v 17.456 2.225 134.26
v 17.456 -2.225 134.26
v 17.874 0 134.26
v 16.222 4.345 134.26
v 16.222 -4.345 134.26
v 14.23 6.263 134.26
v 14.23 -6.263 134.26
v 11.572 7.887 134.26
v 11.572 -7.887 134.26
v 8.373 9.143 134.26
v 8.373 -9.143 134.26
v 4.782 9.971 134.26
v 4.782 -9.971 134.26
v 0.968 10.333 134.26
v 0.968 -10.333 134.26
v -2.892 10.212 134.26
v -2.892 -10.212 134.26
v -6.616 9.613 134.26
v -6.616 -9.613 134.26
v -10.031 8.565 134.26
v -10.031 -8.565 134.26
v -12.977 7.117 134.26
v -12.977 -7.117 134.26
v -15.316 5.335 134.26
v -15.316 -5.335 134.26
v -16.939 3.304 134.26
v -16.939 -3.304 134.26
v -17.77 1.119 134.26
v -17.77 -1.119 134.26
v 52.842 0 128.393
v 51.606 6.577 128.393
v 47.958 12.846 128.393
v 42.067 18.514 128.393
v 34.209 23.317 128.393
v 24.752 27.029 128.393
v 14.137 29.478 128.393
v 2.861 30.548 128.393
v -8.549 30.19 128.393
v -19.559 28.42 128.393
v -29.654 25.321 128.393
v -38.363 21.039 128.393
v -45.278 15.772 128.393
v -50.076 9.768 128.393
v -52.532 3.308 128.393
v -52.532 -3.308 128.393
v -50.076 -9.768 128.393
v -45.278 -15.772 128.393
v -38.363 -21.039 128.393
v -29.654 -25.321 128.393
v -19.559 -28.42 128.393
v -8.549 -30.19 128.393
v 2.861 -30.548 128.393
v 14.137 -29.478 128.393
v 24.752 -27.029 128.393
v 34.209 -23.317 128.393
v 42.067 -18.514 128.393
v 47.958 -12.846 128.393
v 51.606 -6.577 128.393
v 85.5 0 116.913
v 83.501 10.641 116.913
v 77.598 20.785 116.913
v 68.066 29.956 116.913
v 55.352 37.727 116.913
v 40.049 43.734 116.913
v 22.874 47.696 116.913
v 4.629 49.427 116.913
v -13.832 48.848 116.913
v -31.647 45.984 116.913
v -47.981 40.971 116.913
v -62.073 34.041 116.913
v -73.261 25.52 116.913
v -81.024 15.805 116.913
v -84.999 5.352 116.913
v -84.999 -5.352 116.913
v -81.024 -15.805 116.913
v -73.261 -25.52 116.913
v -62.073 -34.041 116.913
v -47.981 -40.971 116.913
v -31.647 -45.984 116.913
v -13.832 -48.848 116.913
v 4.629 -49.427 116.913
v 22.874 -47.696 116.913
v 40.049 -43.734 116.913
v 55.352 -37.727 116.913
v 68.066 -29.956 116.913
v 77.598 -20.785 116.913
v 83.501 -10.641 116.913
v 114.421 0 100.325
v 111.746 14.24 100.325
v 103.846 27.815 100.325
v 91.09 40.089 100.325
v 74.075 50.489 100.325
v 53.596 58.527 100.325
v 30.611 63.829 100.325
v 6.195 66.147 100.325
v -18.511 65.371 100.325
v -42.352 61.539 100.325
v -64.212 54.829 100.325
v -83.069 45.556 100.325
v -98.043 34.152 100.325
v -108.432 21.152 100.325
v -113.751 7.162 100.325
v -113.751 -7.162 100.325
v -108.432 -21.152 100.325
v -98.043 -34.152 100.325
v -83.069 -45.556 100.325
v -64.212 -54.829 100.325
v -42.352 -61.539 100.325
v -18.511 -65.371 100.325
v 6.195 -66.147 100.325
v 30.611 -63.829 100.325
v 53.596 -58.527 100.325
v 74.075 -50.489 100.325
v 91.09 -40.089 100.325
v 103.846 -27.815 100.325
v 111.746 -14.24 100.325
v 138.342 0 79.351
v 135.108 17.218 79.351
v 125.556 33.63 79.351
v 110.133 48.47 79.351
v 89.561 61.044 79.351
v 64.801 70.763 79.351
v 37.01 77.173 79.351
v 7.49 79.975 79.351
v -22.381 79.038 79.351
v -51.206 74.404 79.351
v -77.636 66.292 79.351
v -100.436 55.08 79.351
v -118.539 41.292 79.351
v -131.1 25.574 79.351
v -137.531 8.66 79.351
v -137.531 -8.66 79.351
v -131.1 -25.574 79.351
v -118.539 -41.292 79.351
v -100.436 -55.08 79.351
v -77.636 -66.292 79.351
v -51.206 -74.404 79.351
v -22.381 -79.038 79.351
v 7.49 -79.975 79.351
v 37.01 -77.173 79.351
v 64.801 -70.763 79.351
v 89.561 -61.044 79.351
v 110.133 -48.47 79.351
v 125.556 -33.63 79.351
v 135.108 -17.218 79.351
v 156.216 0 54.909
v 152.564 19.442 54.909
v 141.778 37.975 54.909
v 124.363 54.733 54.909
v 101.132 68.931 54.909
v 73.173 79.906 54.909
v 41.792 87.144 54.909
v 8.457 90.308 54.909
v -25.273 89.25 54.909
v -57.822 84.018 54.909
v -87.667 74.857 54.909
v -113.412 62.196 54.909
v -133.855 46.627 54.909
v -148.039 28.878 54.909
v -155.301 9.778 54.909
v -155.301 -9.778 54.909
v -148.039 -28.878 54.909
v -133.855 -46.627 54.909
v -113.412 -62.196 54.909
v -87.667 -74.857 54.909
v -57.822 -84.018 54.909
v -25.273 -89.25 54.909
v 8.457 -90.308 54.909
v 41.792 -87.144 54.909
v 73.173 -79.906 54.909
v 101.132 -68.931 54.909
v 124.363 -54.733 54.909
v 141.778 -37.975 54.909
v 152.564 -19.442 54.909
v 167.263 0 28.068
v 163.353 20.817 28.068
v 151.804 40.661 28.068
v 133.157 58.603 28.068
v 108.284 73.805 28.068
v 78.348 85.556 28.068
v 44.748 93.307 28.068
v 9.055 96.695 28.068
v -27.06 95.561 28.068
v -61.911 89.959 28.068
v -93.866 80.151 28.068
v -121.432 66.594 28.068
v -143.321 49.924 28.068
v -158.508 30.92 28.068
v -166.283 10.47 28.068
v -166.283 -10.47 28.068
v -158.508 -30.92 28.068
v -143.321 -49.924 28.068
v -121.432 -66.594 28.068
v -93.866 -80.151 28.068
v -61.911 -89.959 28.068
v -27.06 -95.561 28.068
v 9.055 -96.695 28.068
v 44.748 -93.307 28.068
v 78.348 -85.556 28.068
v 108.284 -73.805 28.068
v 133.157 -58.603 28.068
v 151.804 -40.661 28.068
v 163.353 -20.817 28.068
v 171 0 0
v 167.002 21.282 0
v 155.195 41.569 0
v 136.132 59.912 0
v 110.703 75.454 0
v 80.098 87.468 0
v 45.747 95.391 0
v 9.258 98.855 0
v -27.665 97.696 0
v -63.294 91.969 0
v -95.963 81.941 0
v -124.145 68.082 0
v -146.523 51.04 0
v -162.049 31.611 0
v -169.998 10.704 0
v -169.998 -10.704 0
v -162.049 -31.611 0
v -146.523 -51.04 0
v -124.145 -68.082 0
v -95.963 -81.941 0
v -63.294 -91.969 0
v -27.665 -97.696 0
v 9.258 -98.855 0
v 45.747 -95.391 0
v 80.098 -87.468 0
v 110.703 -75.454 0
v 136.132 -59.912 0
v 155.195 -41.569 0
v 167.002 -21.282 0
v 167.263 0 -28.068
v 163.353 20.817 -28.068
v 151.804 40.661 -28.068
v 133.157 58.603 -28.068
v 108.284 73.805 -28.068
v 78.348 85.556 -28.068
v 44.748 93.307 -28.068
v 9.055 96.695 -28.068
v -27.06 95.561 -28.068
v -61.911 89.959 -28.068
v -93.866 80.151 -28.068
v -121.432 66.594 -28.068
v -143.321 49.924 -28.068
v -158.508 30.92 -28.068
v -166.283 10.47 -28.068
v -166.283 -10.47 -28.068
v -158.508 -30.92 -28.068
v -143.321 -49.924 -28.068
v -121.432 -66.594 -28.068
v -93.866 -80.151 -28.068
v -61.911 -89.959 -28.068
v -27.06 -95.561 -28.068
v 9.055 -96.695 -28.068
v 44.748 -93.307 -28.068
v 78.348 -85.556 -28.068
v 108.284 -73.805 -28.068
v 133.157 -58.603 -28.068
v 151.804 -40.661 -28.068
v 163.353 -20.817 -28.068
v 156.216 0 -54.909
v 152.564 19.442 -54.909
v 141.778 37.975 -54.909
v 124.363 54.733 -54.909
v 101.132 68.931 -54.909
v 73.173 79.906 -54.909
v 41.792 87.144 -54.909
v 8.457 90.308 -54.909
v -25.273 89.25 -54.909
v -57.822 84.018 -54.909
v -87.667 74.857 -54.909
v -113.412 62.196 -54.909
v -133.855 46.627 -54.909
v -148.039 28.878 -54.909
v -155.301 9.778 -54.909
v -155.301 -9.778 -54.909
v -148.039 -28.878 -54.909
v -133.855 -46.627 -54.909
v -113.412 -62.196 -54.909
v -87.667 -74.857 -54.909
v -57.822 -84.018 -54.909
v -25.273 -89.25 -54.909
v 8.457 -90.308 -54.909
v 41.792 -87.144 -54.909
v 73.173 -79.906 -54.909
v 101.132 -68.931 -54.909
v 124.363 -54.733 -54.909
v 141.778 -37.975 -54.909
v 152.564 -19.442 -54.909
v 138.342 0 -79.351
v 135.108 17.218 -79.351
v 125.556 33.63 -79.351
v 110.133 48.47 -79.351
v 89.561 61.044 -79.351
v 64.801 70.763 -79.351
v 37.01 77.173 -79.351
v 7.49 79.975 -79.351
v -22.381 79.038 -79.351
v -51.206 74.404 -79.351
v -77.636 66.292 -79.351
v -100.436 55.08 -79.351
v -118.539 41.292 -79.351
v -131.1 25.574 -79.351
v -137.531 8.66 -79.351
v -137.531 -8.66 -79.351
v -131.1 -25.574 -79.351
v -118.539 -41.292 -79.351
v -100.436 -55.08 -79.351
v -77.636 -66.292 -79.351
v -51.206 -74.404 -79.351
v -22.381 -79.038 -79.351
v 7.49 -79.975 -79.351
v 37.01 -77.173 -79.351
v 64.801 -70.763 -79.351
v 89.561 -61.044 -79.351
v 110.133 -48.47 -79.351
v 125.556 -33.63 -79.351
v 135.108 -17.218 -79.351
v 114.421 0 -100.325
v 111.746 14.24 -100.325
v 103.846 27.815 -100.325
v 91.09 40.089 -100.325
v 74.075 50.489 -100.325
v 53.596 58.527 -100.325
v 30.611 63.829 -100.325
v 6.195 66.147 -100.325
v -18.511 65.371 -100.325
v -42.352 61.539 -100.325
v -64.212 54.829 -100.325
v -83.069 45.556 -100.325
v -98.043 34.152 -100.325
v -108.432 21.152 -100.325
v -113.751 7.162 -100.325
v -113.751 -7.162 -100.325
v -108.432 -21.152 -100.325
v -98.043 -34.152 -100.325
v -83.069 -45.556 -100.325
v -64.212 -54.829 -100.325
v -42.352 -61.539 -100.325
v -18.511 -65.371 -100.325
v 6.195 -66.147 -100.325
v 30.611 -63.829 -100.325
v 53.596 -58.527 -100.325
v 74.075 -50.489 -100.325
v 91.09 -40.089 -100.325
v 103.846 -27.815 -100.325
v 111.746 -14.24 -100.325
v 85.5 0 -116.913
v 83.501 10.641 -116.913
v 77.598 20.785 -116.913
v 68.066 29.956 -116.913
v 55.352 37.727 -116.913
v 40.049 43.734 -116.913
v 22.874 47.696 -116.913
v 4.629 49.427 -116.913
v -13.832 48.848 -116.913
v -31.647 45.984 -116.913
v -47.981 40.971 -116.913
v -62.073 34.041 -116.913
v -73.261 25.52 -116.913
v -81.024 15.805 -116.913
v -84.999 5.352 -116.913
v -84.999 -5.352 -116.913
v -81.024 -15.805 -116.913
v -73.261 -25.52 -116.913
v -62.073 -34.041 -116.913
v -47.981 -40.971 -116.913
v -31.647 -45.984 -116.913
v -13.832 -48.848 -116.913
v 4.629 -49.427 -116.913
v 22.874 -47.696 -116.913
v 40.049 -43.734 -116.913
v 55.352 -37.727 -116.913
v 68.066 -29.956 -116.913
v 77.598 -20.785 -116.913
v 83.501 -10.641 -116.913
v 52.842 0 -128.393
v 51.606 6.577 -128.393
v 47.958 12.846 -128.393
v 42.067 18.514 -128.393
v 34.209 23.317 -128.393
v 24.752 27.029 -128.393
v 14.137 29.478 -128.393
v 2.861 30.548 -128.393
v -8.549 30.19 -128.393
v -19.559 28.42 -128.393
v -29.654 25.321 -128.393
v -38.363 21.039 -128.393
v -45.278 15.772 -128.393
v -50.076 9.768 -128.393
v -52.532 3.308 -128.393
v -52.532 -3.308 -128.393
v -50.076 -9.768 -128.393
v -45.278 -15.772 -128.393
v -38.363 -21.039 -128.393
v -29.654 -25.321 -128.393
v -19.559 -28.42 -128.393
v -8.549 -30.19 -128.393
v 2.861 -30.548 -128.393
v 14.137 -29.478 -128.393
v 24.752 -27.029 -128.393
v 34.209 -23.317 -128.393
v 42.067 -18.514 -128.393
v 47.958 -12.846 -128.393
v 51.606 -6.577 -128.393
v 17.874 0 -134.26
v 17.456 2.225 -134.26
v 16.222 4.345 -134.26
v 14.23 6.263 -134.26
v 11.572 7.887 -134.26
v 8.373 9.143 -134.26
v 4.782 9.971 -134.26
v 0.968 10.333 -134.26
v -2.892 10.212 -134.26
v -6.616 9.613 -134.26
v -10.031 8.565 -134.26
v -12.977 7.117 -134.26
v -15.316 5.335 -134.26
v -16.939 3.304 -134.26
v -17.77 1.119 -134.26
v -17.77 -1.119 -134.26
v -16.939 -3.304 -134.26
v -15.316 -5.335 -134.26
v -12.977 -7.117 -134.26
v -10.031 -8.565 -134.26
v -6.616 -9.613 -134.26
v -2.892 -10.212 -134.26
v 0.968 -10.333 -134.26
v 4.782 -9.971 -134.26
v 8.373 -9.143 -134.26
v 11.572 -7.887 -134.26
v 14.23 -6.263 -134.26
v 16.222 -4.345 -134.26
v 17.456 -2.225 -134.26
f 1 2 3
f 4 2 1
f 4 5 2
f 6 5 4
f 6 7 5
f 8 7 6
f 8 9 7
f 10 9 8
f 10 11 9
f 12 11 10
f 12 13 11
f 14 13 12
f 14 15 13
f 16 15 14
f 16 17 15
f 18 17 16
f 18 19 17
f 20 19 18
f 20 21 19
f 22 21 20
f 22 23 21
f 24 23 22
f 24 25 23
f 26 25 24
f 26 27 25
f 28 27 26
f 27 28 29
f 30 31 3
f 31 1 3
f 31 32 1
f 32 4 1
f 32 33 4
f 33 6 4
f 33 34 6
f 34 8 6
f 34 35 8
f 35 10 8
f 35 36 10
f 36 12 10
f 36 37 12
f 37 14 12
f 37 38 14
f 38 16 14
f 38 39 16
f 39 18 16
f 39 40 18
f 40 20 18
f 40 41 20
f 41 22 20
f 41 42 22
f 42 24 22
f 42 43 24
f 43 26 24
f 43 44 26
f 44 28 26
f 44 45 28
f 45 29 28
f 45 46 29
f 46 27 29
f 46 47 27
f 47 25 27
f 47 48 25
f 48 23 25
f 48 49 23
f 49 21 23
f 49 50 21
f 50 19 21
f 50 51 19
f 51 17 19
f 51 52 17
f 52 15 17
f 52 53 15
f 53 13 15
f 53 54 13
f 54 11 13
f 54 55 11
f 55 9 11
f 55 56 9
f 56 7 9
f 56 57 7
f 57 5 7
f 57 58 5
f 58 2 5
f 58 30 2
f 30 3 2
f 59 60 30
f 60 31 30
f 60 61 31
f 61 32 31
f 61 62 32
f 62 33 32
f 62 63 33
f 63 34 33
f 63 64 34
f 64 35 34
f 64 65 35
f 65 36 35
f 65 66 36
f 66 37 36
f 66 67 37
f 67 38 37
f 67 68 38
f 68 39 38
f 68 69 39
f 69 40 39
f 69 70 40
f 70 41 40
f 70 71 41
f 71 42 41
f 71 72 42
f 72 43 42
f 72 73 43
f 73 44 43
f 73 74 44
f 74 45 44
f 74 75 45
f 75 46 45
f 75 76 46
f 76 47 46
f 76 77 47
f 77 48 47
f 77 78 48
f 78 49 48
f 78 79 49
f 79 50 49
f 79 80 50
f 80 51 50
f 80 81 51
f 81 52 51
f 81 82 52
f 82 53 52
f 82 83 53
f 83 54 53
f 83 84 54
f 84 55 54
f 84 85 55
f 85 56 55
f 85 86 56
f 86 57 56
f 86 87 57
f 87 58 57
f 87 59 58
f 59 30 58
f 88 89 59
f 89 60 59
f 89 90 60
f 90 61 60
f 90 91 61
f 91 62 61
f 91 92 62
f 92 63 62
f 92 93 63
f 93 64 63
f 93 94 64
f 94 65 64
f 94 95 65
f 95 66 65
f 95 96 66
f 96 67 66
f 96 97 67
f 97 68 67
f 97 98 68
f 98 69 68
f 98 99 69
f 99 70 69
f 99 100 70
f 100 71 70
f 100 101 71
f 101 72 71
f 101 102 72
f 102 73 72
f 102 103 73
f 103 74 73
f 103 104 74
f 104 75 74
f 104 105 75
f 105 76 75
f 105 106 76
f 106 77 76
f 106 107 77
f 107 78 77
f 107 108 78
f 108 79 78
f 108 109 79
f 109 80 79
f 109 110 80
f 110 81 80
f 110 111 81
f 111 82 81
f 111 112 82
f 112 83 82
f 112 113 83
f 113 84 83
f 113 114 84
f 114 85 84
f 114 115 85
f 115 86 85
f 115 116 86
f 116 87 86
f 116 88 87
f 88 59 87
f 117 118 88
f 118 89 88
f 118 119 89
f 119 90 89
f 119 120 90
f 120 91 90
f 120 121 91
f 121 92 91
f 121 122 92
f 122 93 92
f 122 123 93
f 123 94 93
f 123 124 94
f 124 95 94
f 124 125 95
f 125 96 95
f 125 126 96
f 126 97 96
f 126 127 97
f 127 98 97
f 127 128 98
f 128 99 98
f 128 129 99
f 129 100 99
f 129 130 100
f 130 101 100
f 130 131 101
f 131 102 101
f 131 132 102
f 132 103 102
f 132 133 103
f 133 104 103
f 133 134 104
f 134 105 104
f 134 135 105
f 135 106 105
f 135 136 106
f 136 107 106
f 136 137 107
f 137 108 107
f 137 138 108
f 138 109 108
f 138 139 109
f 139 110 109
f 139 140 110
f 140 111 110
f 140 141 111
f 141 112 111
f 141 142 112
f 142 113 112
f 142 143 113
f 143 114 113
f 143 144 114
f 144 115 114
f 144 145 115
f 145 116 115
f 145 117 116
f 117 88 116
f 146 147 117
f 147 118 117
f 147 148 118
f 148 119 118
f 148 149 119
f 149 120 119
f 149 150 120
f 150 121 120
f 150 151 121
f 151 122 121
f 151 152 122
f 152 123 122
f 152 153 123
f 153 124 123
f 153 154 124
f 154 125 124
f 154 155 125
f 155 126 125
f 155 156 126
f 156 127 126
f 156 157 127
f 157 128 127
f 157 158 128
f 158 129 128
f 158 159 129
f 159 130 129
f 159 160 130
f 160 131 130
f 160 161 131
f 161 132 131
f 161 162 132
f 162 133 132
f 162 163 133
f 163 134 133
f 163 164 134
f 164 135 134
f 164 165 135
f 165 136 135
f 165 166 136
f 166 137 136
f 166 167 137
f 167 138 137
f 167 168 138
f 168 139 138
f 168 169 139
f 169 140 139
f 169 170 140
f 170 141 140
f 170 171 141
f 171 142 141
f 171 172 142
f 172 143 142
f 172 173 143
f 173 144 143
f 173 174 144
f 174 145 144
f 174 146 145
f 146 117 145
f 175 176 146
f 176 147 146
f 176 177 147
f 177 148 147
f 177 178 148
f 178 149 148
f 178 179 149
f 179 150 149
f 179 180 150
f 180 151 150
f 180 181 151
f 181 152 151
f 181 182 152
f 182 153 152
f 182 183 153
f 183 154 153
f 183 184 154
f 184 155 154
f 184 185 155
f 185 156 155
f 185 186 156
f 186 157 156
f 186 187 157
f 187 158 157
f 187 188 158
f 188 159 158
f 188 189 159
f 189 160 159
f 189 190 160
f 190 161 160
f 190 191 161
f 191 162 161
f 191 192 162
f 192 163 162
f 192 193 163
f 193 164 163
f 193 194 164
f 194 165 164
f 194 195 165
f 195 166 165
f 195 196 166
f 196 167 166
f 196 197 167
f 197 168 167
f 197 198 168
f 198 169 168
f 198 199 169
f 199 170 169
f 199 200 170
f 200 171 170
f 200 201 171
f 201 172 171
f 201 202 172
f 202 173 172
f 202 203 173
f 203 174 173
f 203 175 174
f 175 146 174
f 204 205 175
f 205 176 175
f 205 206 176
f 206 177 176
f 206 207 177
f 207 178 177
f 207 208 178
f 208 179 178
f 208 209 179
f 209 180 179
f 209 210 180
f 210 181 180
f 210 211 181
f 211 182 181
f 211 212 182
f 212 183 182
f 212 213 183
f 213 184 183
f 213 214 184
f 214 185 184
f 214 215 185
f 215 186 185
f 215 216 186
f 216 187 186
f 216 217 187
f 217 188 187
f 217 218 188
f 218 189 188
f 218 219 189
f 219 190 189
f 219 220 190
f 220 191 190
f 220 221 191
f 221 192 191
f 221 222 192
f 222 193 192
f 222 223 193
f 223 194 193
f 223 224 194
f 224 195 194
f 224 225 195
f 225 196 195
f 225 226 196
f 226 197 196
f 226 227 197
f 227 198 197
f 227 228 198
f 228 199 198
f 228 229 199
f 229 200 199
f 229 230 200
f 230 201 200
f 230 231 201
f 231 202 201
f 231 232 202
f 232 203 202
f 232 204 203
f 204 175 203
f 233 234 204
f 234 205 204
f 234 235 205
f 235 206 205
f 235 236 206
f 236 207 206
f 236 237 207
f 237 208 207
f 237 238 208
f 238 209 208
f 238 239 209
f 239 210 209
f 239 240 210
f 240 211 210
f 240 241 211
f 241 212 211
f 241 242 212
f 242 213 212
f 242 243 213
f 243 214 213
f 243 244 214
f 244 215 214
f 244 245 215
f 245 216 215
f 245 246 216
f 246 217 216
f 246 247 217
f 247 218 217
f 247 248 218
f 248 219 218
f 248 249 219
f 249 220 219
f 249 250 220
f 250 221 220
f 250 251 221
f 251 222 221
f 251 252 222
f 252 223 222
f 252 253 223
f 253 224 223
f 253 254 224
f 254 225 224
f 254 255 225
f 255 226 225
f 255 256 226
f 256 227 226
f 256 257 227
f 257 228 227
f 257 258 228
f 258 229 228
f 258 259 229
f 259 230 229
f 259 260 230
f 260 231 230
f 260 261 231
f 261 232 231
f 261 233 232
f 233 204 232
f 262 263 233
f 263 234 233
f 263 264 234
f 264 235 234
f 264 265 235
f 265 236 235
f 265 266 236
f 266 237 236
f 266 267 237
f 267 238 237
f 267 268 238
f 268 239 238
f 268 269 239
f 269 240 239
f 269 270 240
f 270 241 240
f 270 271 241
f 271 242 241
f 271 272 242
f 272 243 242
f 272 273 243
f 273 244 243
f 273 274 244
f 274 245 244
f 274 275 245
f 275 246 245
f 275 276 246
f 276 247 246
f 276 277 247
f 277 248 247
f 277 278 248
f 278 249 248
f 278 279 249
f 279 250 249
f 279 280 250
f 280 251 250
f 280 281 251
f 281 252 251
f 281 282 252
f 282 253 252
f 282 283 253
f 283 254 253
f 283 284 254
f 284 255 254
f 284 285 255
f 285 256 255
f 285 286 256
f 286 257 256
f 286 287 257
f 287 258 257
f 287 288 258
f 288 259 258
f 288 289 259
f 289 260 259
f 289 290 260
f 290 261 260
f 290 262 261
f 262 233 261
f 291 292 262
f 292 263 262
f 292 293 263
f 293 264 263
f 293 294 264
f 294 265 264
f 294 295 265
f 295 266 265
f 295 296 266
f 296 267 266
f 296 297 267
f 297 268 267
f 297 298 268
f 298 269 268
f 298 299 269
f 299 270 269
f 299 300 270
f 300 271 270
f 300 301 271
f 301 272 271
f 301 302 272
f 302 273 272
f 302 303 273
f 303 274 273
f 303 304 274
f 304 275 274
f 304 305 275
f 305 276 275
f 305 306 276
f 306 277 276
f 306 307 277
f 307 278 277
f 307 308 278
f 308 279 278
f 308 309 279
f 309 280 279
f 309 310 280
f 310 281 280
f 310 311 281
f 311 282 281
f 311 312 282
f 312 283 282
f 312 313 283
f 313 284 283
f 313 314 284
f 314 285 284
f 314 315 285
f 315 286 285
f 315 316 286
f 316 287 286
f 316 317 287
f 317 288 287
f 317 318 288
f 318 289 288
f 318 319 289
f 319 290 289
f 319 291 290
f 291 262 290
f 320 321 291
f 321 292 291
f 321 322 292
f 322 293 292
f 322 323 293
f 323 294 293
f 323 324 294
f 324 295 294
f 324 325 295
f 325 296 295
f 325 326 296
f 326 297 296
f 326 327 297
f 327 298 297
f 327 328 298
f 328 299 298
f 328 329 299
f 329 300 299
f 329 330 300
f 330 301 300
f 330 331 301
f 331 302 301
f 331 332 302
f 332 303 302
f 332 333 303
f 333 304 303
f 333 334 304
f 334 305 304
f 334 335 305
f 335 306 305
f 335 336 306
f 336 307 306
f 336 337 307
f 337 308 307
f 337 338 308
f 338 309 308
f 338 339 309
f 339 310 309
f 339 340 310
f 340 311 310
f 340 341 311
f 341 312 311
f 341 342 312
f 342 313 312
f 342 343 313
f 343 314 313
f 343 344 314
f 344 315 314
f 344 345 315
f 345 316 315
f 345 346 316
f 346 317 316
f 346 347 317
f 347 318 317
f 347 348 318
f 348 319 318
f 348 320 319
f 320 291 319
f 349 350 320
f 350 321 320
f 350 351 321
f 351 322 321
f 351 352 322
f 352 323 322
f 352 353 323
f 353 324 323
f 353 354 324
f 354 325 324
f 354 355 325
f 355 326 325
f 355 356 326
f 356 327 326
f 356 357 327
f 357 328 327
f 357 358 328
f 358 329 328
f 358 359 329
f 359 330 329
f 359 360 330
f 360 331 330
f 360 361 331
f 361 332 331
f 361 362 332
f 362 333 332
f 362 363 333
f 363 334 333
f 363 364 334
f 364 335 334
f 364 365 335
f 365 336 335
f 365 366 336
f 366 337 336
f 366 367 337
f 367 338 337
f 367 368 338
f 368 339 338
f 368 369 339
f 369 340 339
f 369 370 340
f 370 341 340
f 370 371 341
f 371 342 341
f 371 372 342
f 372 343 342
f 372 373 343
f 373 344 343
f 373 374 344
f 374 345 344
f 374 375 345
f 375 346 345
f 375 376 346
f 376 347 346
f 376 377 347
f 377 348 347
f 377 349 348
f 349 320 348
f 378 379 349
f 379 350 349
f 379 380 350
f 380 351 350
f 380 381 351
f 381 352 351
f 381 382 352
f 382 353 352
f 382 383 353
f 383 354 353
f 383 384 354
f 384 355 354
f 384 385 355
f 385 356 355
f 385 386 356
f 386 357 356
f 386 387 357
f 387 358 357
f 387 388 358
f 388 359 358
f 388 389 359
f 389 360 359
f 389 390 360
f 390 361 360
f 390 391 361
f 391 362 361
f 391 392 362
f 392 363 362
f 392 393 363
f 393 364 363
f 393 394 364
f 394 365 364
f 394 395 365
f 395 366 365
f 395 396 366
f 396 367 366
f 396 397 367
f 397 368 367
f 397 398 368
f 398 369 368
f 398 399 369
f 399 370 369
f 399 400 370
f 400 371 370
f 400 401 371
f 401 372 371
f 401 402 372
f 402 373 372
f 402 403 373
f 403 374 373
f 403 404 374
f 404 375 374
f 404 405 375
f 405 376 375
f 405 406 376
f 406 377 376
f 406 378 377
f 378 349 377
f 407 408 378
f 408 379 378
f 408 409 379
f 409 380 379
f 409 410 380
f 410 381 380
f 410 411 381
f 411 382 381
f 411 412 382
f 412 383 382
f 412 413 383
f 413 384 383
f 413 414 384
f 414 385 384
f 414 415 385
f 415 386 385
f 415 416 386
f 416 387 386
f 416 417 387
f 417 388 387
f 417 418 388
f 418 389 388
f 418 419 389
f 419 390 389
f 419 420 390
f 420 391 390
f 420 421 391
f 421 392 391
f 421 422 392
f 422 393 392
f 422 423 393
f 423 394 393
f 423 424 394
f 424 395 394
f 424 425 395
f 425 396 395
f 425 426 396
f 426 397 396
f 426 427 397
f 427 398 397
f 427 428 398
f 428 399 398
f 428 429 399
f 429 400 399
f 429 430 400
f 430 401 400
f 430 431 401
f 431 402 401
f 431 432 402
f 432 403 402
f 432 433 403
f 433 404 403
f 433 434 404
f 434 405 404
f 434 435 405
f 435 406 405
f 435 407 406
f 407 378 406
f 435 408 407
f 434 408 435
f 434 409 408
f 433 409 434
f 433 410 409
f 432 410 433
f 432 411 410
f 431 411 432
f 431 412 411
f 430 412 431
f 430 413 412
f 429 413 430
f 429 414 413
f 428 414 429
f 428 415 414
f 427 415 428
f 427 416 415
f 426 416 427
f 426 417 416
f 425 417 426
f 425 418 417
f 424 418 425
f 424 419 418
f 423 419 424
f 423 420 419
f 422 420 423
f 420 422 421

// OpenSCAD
// Generated by SolidPython 1.0.1 on 2020-07-29 00:46:54


scale(v = [19, 11, 15]) {
	sphere(r = 9);
}
/***********************************************
*********      SolidPython code:      **********
************************************************
 
# import packages: SolidPython
from solid import *
from solid.utils import *
from itertools import chain, combinations, permutations


class Resize:

    def __init__(self, scad_file):
        self.scad_file = scad_file
        #self.scad_file = import_scad(scad_file)
        # cone/cylinder param:
        self.r1 = 0
        self.r2 = 0
        self.h = 0
        # rectangular prism param:
        self.w = 0
        self.l = 0
        # ellipse param:
        self.r = 0

    # import OpenScad code (file name corresponds to shape)


    # classify shape + parameters
    def assign(self, param1, param2, param3):
        if self.scad_file == 'cone.scad':
            self.r1 = param1
            self.r2 = param2
            self.h = param3
        elif self.scad_file == 'cylinder.scad':
            self.r1 = param1
            self.r2 = param2
            self.h = param3
        elif self.scad_file == 'rectangularPrism.scad':
            self.h = param1
            self.l = param2
            self.w = param3
        else:
            self.r = param1
            self.h = param2

    # resize parameters
    def iterate(self):
        x = range(3, 20, 2)
        i = 1
        if self.scad_file == 'cone.scad':
            tempList = list(permutations(x, 2))
            for temp in tempList:
                param1 = temp[0]
                param2 = temp[1]
                filepath = 'produced_scad_files/' + 'cone' + str(param1) + '_' + str(param2) + '_' + '.scad'
                scad_render_to_file(cylinder(h=param1, r1=param2, r2=0), filepath)

        elif self.scad_file == 'cylinder.scad':
            tempList = list(permutations(x, 3))
            for temp in tempList:
                param1 = temp[0]
                param2 = temp[1]
                filepath = 'produced_scad_files/' + 'cylinder' + str(param1) + '_' + str(param2) + '_' + '.scad'
                scad_render_to_file(cylinder(h=param1, r1=param2, r2=param2), filepath)

        elif self.scad_file == 'rectangularPrism.scad':
            tempList = list(permutations(x, 3))
            for temp in tempList:
                param1 = temp[0]
                param2 = temp[1]
                param3 = temp[2]
                filepath = 'produced_scad_files/' + 'rectangularPrism' + str(param1) + '_' + str(param2) + '_' + str(
                    param3) + '.scad'
                scad_render_to_file(cube(size=(param1, param2, param3)), filepath)

        elif self.scad_file == 'ellipse.scad':
            tempList = list(permutations(x, 4))
            for temp in tempList:
                param1 = temp[0]
                param2 = temp[1]
                param3 = temp[2]
                param4 = temp[3]
                filepath = 'produced_scad_files/' + 'ellipse' + str(param1) + '_' + str(param2) + '_' + str(param3) + '_' + str(param4) + '.scad'
                scad_render_to_file(scale([param1, param2, param3])(sphere(r=param4)), filepath)

    def render_to_scadfile(self):
        scad_render_to_file(scad, 'example.scad') 
 
************************************************/
